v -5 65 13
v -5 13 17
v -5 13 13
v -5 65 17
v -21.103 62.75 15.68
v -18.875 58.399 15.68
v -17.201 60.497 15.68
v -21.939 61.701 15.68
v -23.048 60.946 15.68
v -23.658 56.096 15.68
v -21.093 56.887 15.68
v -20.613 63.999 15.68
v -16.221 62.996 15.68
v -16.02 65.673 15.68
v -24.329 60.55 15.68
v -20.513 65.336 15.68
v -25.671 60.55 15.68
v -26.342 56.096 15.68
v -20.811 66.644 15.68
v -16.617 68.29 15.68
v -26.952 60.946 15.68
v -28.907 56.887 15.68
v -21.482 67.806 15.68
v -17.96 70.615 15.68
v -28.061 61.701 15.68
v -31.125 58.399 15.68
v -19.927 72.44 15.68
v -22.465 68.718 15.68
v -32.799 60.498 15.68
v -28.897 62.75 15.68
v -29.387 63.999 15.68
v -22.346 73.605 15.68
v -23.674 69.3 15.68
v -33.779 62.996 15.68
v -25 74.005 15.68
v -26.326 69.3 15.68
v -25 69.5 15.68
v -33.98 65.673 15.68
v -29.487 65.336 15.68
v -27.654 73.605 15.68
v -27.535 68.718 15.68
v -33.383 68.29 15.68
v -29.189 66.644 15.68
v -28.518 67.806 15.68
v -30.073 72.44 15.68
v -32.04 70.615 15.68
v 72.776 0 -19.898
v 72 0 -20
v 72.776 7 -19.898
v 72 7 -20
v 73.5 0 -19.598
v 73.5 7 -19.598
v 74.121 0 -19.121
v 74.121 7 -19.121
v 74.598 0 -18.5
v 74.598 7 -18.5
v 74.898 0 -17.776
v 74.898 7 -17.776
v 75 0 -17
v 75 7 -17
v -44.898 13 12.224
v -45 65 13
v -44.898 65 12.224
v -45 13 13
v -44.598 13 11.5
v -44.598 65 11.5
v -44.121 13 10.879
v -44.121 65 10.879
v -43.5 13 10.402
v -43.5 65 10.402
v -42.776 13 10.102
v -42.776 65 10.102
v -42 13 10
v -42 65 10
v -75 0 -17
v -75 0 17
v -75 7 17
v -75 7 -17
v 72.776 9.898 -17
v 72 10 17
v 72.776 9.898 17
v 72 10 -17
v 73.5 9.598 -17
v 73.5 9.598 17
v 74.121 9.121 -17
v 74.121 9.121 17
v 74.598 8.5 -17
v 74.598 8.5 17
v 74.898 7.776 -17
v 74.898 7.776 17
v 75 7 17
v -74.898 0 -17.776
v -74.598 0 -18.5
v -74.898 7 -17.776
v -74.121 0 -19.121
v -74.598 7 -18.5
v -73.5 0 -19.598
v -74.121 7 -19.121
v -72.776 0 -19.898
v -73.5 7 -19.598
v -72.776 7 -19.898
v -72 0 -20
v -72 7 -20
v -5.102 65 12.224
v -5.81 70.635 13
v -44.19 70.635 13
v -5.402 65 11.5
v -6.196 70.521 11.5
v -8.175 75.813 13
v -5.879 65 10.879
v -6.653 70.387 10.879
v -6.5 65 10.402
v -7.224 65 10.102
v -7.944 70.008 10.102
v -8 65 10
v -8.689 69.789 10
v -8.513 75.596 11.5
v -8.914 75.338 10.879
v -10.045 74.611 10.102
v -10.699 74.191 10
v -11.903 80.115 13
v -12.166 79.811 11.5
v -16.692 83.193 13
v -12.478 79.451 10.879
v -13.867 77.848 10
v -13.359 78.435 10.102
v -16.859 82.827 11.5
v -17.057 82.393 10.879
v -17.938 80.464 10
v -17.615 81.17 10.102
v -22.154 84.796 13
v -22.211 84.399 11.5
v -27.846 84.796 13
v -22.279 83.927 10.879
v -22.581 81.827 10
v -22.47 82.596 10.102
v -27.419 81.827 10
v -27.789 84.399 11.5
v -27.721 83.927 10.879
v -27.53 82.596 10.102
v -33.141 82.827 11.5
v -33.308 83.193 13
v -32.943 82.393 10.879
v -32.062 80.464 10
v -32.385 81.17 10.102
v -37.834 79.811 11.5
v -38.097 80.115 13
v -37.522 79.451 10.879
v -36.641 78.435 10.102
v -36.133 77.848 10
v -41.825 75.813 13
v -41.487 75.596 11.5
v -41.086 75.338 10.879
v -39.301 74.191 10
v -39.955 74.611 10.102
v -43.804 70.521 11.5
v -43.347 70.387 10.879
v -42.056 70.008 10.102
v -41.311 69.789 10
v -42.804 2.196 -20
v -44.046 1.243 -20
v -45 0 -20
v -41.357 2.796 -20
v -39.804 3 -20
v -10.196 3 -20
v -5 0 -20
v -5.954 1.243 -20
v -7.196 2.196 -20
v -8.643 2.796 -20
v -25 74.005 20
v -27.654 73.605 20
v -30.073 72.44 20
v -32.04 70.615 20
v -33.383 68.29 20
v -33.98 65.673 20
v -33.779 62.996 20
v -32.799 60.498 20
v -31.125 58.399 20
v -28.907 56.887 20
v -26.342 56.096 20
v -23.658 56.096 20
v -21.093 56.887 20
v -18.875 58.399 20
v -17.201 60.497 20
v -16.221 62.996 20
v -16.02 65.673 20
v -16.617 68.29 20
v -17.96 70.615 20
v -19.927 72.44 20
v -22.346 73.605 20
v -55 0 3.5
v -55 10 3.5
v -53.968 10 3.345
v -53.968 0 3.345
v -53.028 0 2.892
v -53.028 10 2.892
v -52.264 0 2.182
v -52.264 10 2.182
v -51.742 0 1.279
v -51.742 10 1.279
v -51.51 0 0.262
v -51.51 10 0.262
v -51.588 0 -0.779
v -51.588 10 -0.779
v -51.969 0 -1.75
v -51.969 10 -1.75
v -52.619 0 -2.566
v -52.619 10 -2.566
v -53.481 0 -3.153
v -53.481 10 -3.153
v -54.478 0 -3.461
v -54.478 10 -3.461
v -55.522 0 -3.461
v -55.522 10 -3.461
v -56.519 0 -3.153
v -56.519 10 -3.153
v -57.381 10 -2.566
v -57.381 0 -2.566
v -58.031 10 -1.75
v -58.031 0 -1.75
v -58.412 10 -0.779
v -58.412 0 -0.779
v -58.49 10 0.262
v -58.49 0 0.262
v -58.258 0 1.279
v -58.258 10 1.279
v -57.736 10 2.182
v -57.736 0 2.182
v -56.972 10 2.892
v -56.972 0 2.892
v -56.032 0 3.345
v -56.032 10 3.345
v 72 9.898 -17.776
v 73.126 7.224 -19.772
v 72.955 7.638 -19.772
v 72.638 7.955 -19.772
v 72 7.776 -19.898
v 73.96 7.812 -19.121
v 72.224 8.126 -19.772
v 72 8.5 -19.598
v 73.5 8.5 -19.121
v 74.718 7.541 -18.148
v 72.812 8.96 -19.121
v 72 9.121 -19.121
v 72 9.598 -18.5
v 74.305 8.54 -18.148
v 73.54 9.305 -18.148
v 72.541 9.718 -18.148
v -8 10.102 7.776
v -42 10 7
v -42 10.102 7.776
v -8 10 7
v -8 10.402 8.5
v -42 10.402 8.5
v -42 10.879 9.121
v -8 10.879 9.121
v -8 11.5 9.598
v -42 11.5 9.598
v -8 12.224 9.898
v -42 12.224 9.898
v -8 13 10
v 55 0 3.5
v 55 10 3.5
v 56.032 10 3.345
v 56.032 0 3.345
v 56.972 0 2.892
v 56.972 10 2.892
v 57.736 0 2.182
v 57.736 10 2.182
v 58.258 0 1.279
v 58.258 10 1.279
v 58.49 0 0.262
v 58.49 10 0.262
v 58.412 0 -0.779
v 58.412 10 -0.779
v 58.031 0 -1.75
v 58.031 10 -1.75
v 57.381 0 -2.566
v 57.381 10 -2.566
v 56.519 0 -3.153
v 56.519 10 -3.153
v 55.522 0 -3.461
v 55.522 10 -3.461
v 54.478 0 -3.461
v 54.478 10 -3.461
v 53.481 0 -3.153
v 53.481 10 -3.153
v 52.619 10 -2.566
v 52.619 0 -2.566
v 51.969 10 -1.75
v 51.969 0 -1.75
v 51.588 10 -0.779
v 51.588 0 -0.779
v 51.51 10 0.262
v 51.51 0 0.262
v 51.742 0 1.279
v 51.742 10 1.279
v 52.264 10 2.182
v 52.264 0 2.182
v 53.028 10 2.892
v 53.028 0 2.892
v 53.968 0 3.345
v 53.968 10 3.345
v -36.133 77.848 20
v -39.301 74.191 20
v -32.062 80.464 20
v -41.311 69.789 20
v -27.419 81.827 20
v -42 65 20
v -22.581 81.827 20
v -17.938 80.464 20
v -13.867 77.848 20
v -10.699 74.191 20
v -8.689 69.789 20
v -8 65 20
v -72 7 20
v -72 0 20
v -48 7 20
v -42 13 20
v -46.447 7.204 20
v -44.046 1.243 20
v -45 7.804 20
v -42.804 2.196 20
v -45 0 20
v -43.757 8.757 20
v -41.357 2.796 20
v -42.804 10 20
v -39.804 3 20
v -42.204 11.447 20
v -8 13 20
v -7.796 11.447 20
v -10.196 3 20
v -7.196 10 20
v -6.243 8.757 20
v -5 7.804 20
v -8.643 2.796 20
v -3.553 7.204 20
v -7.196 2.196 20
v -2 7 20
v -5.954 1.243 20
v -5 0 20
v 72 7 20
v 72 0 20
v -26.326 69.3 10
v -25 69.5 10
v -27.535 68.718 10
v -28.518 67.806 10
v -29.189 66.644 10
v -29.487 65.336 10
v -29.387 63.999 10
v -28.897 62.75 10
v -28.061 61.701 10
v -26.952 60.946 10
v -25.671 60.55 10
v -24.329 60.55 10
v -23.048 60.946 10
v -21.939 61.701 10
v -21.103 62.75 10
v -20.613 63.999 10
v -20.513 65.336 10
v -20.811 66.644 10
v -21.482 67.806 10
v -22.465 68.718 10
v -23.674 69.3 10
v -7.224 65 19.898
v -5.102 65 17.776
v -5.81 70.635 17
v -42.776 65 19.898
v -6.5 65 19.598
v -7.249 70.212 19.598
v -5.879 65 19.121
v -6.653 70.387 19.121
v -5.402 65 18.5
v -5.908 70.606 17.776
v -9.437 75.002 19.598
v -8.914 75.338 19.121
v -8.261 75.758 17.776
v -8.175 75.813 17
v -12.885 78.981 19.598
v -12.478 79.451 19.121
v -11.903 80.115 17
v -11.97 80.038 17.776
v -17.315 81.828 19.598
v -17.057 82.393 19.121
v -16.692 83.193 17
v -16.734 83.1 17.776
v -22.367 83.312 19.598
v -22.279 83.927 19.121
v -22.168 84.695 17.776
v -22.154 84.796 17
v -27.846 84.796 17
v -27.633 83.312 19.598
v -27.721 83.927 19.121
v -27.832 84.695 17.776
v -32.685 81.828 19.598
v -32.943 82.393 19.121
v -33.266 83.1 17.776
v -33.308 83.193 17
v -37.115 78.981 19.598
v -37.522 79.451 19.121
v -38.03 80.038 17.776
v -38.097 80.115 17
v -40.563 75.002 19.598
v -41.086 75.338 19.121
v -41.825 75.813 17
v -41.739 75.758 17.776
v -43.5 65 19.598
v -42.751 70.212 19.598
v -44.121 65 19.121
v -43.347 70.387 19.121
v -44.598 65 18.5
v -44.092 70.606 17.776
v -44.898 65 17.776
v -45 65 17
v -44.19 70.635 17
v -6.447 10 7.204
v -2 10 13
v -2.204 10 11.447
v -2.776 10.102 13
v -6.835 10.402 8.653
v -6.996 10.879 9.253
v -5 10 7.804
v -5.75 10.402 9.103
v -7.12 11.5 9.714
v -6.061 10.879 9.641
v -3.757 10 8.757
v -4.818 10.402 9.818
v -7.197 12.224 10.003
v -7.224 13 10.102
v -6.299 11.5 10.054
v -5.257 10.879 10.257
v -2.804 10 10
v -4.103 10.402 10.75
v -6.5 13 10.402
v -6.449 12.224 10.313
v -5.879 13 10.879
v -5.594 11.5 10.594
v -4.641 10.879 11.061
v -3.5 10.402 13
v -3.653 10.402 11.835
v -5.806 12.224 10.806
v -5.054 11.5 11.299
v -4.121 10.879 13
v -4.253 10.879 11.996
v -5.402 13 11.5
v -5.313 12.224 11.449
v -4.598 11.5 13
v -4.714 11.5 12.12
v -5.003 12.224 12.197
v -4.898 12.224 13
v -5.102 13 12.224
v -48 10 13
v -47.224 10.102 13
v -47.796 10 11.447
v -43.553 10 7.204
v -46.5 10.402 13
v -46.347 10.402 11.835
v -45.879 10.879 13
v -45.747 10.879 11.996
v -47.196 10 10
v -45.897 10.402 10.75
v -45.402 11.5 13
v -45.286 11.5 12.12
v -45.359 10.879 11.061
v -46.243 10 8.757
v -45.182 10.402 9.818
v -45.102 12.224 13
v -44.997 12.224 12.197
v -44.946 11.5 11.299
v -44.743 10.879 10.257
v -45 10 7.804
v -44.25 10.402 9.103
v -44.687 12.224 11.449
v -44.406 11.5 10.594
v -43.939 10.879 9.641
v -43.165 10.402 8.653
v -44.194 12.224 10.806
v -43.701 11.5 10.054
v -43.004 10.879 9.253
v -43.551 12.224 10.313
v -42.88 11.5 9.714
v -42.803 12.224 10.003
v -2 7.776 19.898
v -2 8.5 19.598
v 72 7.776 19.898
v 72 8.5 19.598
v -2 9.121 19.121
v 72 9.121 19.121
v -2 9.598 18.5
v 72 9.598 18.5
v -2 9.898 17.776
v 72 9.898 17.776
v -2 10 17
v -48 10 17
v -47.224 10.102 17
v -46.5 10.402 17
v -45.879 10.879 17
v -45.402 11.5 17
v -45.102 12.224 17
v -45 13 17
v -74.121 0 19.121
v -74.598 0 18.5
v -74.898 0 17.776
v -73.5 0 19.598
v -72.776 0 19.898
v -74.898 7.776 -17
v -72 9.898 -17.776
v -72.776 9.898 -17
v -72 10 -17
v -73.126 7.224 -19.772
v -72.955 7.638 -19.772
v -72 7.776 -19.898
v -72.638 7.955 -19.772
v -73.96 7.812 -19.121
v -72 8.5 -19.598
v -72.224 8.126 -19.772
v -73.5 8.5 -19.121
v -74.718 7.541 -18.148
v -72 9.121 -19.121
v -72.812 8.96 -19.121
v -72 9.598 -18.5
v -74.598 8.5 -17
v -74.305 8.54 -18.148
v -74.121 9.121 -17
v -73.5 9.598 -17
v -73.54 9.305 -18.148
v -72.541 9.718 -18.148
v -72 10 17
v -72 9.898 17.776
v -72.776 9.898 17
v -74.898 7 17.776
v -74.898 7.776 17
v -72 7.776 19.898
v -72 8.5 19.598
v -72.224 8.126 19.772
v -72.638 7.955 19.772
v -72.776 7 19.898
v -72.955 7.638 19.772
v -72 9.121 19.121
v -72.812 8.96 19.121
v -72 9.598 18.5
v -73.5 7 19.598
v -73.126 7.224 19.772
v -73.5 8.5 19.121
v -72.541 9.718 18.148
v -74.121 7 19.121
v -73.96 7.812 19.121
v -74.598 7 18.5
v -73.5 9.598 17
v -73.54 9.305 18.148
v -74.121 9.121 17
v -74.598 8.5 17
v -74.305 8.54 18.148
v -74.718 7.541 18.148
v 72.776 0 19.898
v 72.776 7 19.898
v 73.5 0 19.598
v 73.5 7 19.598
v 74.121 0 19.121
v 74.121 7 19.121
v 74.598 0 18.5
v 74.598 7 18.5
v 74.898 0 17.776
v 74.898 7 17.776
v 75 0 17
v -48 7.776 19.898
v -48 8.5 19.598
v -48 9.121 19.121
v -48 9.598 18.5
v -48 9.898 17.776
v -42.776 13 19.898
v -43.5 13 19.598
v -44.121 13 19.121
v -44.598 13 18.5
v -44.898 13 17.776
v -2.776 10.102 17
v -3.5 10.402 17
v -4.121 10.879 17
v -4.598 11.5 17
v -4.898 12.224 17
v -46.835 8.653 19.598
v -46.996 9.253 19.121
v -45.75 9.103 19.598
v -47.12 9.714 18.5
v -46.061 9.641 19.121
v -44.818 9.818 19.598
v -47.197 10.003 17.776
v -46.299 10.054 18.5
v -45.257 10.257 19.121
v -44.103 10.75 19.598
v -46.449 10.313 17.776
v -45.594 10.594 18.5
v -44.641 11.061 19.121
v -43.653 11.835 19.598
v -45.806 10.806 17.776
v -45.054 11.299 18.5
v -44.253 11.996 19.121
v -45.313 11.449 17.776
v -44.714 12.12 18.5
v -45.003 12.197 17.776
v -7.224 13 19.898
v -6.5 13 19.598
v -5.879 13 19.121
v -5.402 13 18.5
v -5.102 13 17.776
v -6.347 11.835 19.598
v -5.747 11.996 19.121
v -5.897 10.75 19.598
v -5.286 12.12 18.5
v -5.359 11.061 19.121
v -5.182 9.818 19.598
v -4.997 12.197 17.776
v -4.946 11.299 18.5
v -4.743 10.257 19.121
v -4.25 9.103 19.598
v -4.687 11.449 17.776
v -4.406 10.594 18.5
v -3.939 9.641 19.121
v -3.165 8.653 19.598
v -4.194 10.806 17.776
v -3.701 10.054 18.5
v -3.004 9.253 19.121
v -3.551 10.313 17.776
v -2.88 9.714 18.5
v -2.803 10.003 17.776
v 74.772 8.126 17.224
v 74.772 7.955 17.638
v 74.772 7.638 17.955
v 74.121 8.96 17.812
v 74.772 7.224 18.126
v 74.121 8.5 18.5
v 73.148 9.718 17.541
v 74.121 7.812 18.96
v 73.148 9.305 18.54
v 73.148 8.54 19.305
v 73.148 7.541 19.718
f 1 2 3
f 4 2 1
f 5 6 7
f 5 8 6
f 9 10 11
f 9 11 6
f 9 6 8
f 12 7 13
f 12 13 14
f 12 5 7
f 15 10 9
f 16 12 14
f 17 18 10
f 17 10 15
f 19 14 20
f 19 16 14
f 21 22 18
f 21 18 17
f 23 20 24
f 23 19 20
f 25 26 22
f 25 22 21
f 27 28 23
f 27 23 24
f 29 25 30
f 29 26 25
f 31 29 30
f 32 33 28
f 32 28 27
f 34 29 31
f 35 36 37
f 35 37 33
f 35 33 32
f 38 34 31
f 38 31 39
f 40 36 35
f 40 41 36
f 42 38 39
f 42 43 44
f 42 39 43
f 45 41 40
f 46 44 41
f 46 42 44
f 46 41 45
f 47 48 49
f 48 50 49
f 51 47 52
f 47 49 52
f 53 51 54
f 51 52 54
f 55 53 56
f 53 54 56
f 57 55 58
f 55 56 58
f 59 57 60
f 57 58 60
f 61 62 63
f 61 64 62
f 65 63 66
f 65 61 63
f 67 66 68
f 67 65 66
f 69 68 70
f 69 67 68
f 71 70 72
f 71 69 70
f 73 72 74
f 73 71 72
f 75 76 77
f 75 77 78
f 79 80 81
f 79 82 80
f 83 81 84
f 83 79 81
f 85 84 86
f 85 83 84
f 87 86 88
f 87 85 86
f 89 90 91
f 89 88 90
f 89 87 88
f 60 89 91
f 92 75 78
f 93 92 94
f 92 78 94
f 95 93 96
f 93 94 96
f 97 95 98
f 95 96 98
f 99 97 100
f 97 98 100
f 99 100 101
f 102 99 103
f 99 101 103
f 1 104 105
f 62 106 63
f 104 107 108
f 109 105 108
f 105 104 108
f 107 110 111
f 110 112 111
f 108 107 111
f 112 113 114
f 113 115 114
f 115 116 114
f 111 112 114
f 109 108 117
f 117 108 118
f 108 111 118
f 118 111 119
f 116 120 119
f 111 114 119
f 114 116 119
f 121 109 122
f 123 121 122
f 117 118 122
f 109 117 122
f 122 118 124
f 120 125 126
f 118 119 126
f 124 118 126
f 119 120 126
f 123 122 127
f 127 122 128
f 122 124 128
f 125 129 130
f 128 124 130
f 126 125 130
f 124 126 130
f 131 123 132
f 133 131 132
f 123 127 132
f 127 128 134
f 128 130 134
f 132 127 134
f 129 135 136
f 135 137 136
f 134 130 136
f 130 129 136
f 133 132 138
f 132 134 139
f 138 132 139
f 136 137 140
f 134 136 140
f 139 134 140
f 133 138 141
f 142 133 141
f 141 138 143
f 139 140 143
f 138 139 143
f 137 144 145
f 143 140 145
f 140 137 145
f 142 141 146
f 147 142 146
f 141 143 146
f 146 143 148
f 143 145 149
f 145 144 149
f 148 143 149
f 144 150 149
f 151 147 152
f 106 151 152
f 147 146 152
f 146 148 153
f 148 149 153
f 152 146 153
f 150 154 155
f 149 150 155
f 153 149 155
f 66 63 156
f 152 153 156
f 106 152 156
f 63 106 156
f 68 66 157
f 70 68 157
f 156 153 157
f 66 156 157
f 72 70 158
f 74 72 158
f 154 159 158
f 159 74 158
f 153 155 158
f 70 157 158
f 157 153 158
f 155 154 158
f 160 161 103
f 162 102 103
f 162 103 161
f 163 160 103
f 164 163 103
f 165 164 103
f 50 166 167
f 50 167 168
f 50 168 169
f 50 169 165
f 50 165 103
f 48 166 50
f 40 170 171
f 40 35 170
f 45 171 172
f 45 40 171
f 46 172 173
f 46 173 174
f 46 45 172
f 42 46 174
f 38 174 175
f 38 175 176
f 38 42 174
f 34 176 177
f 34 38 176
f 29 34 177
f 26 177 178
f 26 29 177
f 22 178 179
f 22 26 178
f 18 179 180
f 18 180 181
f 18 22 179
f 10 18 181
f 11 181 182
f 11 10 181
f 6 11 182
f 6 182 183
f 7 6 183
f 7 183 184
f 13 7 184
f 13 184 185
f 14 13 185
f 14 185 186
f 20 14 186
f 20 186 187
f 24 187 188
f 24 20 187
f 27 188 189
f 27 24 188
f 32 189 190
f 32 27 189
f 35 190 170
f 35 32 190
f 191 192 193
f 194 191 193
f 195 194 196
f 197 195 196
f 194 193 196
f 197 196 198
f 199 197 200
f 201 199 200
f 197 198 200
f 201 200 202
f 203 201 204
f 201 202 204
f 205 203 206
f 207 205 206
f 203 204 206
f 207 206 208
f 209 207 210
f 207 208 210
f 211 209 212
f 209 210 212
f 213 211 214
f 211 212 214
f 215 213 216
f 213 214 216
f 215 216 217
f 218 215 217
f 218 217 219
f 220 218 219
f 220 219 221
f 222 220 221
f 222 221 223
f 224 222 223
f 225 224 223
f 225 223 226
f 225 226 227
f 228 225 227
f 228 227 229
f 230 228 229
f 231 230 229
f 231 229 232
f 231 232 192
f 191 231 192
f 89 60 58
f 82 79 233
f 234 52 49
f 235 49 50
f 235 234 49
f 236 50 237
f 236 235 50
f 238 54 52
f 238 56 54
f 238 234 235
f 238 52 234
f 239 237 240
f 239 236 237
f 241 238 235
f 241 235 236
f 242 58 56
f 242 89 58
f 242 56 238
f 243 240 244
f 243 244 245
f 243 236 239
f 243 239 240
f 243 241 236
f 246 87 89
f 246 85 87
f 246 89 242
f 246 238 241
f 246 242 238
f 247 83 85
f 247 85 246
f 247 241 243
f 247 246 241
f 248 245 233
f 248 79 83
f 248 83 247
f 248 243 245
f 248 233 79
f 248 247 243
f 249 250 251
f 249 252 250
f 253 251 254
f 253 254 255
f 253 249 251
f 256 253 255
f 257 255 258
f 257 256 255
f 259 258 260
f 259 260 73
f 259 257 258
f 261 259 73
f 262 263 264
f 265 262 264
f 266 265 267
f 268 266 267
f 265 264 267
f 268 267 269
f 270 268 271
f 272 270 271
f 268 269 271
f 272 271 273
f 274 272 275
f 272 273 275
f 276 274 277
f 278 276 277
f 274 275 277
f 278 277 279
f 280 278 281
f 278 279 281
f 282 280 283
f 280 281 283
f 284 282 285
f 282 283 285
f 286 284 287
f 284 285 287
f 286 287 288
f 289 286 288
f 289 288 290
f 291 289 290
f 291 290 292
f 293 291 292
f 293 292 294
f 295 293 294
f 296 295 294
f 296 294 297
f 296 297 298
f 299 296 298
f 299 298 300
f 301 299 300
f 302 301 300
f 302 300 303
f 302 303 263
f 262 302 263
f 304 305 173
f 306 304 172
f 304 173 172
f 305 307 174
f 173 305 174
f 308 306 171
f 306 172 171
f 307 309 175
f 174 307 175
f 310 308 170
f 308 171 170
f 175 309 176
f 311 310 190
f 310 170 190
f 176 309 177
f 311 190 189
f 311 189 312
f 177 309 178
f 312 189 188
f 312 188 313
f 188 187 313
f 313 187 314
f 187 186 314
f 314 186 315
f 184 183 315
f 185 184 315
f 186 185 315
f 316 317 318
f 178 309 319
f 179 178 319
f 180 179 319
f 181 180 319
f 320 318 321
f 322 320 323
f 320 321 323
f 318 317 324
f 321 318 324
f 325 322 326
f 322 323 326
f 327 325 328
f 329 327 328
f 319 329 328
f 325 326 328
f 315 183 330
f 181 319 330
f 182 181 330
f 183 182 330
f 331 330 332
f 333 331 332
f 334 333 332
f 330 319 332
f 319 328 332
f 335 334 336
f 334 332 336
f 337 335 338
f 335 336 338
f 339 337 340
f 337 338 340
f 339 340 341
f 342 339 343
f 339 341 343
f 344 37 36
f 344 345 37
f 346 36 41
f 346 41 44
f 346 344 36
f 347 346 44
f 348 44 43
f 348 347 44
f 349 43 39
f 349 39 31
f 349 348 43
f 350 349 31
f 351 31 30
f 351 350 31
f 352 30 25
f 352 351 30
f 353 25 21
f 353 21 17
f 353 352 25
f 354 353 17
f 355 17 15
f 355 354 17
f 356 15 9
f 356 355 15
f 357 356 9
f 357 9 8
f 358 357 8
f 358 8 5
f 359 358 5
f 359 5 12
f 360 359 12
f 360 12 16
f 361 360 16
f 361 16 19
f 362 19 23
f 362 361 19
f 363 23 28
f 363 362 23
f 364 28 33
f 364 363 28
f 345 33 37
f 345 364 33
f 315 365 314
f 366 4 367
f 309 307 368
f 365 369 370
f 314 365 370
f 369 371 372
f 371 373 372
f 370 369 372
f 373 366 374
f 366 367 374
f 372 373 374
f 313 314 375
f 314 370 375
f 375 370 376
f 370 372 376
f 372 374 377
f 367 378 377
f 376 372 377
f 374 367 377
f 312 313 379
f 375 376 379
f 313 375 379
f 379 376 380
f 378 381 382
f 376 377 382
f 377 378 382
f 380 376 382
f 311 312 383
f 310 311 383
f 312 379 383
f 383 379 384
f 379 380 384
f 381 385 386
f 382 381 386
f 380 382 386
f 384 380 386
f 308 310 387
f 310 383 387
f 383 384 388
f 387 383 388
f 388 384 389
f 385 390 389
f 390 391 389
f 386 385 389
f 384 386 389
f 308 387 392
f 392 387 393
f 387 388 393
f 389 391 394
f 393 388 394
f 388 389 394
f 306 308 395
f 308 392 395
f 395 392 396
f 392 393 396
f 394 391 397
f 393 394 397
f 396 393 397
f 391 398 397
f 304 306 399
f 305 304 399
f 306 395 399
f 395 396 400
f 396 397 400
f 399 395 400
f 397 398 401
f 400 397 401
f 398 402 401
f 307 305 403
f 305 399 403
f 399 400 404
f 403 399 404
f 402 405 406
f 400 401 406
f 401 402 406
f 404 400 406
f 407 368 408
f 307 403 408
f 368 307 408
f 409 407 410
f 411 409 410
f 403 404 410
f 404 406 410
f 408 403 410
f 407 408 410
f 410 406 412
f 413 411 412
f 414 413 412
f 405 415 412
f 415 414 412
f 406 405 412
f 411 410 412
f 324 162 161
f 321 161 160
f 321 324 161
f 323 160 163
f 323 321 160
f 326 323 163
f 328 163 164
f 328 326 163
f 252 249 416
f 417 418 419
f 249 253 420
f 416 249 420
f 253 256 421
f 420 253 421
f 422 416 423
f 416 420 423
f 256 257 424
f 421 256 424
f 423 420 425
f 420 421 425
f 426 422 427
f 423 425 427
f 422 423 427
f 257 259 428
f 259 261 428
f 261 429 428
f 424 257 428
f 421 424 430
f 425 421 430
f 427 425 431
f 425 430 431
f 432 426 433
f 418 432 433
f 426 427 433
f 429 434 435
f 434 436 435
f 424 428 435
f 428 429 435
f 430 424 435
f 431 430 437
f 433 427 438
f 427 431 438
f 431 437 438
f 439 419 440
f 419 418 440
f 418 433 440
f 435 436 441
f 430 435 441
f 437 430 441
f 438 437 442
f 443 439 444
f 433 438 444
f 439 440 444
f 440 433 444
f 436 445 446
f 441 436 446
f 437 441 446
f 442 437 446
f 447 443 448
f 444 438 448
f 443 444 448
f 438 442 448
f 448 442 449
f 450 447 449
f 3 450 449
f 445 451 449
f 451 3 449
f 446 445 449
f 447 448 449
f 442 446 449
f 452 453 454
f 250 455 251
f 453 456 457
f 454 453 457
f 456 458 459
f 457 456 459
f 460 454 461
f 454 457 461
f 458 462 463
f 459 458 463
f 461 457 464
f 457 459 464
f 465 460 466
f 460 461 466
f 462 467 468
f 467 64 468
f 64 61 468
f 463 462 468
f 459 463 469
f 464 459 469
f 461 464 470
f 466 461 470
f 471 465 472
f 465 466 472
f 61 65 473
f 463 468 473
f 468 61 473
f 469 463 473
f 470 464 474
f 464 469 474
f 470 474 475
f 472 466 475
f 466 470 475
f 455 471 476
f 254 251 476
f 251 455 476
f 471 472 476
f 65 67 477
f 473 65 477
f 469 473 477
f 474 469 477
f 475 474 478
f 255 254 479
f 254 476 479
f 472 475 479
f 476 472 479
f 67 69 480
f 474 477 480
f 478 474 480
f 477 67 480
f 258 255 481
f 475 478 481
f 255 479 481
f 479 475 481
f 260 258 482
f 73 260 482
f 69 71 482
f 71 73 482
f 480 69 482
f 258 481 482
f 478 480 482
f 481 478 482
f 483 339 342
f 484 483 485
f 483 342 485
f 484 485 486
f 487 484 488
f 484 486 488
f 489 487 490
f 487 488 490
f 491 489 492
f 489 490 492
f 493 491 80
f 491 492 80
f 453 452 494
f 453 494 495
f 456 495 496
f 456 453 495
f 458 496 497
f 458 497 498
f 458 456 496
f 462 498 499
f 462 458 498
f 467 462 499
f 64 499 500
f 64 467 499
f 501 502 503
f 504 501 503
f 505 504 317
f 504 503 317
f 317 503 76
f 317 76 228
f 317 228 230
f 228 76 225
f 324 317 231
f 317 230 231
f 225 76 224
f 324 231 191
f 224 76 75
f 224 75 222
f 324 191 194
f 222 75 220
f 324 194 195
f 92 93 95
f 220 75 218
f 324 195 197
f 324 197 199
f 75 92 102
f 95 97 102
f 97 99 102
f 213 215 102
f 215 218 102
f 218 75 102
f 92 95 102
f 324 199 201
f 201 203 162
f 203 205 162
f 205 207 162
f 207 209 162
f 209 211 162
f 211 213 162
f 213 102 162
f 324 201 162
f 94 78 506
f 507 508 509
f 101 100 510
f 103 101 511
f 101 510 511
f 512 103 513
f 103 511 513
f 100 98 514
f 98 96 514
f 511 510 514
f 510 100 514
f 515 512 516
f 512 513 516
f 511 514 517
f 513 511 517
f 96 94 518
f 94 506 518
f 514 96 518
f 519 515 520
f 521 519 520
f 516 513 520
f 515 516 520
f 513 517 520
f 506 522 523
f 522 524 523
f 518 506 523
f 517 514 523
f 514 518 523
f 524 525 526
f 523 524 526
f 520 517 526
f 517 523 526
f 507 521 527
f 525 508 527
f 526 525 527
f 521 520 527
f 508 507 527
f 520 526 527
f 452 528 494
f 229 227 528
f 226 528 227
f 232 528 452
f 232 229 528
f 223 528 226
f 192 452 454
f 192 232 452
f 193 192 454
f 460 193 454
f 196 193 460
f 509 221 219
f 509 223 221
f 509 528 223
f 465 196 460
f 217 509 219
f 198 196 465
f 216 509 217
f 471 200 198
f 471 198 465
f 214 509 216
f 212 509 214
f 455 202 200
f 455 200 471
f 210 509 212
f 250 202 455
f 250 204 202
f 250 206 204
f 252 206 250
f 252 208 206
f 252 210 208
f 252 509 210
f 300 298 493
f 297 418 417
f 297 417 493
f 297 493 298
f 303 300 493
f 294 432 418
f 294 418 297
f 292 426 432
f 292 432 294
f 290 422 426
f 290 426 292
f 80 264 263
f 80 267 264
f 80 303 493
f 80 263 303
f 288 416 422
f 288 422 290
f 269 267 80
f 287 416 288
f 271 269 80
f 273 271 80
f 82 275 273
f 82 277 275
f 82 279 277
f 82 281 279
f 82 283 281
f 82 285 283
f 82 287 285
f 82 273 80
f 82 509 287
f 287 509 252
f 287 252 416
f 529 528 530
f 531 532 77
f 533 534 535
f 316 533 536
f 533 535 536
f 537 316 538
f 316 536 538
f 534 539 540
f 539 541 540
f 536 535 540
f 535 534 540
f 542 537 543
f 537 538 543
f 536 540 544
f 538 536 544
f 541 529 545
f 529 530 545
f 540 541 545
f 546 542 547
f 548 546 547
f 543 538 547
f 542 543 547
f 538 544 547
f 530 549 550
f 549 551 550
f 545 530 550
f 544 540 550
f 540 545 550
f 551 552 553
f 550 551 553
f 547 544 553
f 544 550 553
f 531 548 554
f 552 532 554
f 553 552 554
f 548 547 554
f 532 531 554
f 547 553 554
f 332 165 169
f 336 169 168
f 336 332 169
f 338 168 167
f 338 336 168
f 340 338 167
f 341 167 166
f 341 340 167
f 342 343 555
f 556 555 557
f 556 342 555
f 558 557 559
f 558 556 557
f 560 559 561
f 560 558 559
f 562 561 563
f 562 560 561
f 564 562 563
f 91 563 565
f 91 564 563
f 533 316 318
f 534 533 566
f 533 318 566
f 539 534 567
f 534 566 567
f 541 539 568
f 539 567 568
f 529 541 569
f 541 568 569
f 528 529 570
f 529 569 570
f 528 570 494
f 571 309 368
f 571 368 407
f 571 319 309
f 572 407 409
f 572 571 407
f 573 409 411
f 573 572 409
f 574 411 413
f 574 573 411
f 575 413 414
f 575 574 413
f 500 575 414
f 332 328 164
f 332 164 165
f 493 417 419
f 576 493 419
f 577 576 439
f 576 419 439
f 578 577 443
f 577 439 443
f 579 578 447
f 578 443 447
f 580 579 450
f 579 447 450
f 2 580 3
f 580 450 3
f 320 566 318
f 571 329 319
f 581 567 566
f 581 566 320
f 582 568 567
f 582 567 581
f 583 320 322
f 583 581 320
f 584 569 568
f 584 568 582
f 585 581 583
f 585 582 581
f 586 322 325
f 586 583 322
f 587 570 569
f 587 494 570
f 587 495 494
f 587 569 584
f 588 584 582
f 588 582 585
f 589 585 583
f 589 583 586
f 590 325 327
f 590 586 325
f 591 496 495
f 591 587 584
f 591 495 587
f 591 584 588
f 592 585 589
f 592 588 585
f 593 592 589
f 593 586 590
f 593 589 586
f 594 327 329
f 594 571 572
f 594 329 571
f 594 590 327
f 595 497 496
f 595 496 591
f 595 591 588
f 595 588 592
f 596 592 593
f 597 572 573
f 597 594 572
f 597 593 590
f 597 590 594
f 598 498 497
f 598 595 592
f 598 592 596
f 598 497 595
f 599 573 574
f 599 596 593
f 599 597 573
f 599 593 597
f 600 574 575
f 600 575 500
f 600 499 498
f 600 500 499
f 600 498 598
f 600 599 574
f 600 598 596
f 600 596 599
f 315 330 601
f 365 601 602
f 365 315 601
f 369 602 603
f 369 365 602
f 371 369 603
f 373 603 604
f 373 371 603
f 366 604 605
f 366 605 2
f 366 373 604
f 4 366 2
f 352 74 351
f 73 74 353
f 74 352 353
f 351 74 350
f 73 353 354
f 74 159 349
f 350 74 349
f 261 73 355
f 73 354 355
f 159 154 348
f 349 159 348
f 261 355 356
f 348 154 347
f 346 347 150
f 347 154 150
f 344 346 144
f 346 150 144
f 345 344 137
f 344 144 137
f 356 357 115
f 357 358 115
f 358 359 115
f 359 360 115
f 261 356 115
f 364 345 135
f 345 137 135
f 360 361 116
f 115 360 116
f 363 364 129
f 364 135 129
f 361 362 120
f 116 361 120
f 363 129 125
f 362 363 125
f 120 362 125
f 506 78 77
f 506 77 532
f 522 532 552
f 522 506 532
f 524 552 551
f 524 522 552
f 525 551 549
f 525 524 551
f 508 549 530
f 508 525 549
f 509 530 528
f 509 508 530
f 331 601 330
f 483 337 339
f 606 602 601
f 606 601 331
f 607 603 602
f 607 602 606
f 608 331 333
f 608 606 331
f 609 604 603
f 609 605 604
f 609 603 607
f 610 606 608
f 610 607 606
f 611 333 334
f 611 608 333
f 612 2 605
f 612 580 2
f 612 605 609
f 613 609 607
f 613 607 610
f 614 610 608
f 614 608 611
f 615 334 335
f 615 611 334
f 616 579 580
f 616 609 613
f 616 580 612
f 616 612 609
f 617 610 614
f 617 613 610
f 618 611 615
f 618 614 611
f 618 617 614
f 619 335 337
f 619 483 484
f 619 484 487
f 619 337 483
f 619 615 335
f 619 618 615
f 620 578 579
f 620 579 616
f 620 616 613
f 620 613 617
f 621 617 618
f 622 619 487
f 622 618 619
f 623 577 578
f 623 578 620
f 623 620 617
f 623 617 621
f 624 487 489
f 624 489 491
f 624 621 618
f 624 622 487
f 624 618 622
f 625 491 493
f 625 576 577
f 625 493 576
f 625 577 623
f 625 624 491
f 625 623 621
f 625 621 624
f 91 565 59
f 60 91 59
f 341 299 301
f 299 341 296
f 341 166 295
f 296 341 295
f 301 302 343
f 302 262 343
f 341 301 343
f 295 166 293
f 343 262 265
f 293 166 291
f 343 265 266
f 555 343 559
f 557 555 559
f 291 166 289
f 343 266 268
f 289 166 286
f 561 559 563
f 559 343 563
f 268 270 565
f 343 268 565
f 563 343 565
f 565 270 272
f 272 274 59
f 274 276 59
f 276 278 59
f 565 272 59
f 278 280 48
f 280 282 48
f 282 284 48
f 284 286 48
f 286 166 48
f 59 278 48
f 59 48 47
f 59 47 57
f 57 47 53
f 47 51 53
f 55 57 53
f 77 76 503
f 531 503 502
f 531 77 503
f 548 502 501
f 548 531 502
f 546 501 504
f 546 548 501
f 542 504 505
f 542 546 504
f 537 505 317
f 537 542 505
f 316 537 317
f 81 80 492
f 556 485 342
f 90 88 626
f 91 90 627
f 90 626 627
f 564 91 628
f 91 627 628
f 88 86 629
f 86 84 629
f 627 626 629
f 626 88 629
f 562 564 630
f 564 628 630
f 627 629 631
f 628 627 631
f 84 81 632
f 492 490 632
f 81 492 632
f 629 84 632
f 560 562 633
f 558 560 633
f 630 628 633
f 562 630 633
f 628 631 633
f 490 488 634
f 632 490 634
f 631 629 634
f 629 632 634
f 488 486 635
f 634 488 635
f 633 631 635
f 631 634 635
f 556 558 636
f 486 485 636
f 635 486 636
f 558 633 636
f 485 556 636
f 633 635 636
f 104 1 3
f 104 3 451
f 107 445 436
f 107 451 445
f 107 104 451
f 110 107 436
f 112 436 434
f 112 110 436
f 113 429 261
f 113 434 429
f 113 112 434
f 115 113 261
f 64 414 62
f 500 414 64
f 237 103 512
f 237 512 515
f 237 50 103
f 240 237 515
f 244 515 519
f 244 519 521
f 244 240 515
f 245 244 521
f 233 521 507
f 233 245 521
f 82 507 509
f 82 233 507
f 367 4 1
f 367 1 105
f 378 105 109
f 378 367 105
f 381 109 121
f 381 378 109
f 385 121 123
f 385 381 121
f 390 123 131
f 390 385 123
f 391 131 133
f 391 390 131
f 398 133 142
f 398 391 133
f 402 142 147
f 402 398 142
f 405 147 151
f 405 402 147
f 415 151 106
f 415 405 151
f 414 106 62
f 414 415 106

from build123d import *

# Parameters (mm, degrees)
SKETCH1_W           = 150
SKETCH1_H           = 40
BOSS_EXTRUDE1_DEPTH = 10
BOSS_EXTRUDE2_DEPTH = 10
CUT_EXTRUDE1_DEPTH  = 121.208152802
SKETCH8_R           = 3.5
CUT_EXTRUDE2_DEPTH  = 108.935165725
FILLET1_R           = 3


with BuildPart() as part:
    # Sketch1 → Boss-Extrude1 (new body)
    with BuildSketch(Plane(origin=(0, 0, 0), x_dir=(1, 0, 0), z_dir=(0, 1, 0))):
        Rectangle(SKETCH1_W, SKETCH1_H)
    extrude(amount=BOSS_EXTRUDE1_DEPTH)

    # Sketch2 → Boss-Extrude2 (add)
    with BuildSketch(Plane.XY.offset(20)):
        with BuildLine():
            Line((-45, 10), (-5, 10))
            Line((-5, 10), (-5, 65))
            ThreePointArc((-5, 65), (-25, 85), (-45, 65))
            Line((-45, 65), (-45, 10))
        make_face()
    extrude(amount=-BOSS_EXTRUDE2_DEPTH)

    # Sketch6 → CBORE for M6 SBHCS1 (revolve, cut)
    with BuildSketch(Plane(origin=(-25, 65, 10), x_dir=(0, 1, 0), z_dir=(1, 0, 0))):
        Polygon((0, 0), (0, 10), (9.005, 10), (9.005, 5.68), (4.5, 5.68), (4.5, 0), align=None)
    revolve(axis=Axis((-25, 65, 3.65), (0, 0, 1)), mode=Mode.SUBTRACT)

    # Sketch7 → Cut-Extrude1 (cut, through all)
    with BuildSketch(Plane.XY.offset(20)):
        with BuildLine():
            Line((-39.803847577, 3), (-10.196152423, 3))
            ThreePointArc((-10.196152423, 3), (-7.196152423, 2.196152423), (-5, 0))
            Line((-5, 0), (-45, 0))
            ThreePointArc((-45, 0), (-42.803847577, 2.196152423), (-39.803847577, 3))
        make_face()
    extrude(amount=-CUT_EXTRUDE1_DEPTH, mode=Mode.SUBTRACT)

    # Sketch8 → Cut-Extrude2 (cut, through all)
    with BuildSketch(Plane(origin=(0, 10, 0), x_dir=(1, 0, 0), z_dir=(0, 1, 0))):
        with Locations(Location((-55, 0, 0), (0, 0, 270))):
            Circle(SKETCH8_R)
        with Locations(Location((55, 0, 0), (0, 0, 270))):
            Circle(SKETCH8_R)
    extrude(amount=-CUT_EXTRUDE2_DEPTH, mode=Mode.SUBTRACT)

    # Fillet1
    fillet1_edges = [part.edges().sort_by_distance(p)[0] for p in [
        (-75, 10, 0),
        (35, 10, 20),
        (-45, 37.5, 10),
        (-45, 10, 15),
        (-25, 85, 10),
        (-5, 37.5, 10),
        (-60, 10, 20),
        (-25, 10, 10),
        (-5, 10, 15),
        (-45, 37.5, 20),
        (-5, 37.5, 20),
        (-25, 85, 20),
        (75, 10, 0),
        (75, 5, 20),
        (-75, 5, 20),
        (-75, 5, -20),
        (75, 5, -20),
        (0, 10, -20),
    ]]
    fillet(fillet1_edges, radius=FILLET1_R)


solid = part.part
